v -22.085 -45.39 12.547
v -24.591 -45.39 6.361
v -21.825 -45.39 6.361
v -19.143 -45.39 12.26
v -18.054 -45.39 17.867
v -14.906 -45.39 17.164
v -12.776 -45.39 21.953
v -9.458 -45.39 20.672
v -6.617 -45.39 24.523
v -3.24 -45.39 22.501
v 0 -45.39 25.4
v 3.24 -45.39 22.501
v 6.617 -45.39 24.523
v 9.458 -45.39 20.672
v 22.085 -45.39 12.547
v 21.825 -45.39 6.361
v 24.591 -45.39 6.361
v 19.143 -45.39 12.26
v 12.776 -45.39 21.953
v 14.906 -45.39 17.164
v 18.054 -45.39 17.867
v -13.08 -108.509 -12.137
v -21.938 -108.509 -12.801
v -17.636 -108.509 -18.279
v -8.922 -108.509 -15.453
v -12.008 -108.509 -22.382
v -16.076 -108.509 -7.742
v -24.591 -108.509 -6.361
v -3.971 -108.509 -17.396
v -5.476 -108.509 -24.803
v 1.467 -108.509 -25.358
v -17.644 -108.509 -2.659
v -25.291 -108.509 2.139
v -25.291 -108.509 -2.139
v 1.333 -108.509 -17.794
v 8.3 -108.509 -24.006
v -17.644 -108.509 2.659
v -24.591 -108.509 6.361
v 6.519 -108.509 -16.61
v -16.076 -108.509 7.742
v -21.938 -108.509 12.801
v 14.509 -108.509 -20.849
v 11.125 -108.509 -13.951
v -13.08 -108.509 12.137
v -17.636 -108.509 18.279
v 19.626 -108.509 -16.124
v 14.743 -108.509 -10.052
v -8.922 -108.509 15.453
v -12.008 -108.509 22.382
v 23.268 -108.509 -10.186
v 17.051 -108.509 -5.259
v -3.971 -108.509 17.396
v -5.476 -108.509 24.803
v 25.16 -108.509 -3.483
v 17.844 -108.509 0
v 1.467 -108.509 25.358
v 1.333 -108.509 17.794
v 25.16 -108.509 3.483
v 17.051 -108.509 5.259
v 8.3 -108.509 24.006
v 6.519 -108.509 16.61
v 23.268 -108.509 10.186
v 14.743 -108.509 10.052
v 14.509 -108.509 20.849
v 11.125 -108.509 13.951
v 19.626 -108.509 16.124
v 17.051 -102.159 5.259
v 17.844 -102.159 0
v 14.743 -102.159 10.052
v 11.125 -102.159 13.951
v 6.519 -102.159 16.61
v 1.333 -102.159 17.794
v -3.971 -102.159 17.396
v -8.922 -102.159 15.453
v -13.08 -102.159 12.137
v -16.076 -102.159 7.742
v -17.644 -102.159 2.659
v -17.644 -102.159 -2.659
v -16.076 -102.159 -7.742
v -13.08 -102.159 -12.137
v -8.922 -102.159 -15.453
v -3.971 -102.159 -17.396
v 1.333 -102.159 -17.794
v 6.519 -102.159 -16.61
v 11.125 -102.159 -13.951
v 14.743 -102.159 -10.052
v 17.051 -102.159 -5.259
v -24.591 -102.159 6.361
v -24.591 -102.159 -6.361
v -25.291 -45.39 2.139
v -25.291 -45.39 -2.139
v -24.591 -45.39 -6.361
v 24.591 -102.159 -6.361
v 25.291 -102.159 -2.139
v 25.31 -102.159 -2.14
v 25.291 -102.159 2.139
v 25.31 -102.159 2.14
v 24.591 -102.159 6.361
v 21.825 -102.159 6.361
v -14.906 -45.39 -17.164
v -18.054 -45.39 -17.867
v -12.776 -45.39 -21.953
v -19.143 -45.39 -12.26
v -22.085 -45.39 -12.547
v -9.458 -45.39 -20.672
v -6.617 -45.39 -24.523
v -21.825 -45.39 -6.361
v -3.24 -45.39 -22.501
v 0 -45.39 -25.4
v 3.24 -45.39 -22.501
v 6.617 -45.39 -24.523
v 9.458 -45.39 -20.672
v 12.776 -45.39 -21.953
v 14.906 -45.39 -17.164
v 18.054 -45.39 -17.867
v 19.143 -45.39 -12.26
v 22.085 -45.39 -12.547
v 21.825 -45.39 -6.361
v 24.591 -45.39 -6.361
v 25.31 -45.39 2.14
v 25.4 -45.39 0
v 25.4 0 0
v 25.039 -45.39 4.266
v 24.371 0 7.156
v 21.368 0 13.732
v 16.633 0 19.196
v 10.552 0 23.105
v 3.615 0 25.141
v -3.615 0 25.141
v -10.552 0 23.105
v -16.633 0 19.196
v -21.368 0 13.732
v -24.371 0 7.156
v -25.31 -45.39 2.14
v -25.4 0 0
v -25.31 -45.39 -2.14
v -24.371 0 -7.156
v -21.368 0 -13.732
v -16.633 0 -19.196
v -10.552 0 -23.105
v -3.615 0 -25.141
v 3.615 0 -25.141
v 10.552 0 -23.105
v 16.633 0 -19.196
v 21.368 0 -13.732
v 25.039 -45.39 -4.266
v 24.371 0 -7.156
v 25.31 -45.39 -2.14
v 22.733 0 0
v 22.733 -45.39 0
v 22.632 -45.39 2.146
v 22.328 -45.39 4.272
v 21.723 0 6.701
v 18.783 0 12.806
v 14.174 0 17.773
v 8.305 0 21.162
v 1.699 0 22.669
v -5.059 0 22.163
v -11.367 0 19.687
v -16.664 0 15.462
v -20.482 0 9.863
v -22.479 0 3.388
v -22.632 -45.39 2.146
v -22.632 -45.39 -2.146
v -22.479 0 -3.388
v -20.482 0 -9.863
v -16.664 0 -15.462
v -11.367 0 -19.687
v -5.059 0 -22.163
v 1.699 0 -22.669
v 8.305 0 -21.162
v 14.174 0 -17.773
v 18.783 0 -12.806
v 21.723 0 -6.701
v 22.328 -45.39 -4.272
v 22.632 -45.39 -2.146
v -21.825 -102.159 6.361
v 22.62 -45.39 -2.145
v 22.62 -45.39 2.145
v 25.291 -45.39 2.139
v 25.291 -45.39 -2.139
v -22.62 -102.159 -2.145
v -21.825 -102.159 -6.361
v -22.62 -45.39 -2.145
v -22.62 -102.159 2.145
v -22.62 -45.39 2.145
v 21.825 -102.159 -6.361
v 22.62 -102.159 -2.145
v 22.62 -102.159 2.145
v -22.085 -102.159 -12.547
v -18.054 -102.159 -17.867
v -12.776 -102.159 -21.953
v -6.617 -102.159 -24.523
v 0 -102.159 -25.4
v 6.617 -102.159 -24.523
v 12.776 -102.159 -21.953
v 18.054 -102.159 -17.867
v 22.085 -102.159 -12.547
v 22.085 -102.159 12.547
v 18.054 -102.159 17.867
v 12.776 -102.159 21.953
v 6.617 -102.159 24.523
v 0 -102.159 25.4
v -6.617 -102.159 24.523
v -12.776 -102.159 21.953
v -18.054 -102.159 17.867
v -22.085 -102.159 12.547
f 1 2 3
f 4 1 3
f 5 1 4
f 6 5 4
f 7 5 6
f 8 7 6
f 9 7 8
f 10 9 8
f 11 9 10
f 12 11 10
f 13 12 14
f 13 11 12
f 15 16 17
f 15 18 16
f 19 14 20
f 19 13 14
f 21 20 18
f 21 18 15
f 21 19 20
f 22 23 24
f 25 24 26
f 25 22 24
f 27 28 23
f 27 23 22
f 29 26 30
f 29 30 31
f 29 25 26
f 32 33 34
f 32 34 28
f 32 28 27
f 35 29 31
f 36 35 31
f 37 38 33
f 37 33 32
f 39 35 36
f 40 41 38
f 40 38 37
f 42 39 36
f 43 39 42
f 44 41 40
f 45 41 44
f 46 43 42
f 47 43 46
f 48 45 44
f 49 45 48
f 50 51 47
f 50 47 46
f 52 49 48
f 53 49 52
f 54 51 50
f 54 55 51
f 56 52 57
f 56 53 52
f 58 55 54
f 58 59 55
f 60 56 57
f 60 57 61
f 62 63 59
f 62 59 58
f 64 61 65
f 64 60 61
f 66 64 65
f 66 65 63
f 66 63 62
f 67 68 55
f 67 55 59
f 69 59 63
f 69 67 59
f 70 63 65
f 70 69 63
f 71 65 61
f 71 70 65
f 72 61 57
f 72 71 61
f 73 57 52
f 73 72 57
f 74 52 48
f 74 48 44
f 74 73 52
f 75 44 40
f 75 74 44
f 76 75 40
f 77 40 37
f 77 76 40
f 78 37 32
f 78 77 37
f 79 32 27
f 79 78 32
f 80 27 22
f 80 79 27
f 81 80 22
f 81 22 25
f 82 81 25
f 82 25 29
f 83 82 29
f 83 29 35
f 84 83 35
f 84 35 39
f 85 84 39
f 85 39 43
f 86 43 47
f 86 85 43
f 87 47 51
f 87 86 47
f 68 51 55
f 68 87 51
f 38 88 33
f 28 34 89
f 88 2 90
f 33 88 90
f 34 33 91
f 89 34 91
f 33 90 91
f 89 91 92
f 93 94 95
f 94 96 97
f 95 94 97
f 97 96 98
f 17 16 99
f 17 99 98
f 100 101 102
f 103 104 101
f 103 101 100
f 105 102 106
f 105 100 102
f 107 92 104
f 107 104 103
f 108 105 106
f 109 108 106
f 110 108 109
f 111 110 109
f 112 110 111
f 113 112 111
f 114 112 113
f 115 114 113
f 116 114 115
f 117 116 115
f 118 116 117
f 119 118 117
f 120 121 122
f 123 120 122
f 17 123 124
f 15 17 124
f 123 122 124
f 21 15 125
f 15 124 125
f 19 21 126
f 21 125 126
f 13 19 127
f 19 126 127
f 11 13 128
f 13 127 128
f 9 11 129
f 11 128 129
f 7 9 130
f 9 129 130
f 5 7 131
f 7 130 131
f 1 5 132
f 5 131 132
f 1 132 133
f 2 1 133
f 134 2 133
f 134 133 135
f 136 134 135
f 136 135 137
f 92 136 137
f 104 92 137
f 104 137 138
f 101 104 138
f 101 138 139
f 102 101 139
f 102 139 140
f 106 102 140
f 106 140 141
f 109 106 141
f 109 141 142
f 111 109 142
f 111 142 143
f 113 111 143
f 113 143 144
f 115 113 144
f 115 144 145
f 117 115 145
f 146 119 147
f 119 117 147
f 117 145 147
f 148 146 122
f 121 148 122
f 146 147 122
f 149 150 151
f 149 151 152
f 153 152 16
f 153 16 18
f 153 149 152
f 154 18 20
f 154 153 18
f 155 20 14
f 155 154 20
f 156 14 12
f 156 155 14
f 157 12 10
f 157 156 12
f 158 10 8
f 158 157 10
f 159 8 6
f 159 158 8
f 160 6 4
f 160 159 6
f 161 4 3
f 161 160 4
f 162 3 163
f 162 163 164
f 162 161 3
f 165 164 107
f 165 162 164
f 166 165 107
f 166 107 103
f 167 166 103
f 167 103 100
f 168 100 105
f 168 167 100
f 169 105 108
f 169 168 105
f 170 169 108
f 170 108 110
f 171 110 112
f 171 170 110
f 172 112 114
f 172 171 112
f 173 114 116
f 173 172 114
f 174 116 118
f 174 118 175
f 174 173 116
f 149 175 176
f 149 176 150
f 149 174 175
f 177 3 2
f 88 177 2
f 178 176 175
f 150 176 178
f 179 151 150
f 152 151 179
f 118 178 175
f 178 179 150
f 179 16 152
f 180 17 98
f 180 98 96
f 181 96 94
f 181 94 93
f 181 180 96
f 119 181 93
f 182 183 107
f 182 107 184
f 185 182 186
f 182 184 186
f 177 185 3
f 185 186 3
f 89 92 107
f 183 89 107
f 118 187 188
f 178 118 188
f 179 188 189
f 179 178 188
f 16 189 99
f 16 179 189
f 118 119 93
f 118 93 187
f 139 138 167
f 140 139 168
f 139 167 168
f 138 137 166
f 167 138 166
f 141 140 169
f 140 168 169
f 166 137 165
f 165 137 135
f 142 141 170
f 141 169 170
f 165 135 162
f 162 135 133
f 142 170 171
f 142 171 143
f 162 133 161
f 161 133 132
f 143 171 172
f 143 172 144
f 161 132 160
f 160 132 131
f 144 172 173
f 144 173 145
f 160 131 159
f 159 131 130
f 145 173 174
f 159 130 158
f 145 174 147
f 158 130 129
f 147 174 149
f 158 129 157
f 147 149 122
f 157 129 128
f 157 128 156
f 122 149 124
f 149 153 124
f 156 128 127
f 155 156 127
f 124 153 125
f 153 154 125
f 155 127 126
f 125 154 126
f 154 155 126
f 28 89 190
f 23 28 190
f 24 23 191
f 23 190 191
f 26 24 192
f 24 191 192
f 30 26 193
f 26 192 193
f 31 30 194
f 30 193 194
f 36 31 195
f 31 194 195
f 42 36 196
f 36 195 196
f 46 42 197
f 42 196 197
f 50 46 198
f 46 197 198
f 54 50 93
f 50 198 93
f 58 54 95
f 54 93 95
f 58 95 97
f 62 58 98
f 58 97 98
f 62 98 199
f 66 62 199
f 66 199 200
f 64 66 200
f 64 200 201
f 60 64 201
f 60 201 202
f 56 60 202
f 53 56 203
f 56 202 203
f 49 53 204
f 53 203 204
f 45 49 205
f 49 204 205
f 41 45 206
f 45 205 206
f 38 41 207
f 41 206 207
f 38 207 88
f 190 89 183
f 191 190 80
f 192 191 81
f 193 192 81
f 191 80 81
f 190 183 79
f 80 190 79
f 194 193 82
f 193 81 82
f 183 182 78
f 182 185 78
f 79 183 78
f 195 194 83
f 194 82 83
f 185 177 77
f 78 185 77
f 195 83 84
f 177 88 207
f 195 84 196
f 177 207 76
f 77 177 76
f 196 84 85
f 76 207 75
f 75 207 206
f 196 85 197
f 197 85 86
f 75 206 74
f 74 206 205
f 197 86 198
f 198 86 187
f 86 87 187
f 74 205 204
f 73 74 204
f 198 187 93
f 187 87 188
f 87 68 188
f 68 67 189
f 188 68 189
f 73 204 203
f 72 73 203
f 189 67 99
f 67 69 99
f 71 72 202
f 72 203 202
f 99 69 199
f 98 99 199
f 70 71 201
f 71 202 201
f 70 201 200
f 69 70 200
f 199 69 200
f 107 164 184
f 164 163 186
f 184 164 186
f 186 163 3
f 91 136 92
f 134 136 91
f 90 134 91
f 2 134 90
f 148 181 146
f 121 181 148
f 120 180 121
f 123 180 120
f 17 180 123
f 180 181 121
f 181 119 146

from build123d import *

# Parameters (mm, degrees)
F0_R     = 25.4
F0_R_2   = 22.733
F1_DEPTH = 45.3898
F3_DEPTH = 56.769
F5_R     = 17.8435
F6_DEPTH = 6.35


# Not quite as in the source:
# - a feature of the source that left no trace in its solid (it failed there, or was rolled back) is left out


with BuildPart() as f1:
    # F0 (on Front) → F1 (new body)
    with BuildSketch(Plane.XZ):
        Circle(F0_R)
        Circle(F0_R_2, mode=Mode.SUBTRACT)
    extrude(amount=F1_DEPTH)

    # F2 (on face) → F3 (join)
    with BuildSketch(Plane.XZ.offset(45.3898)):
        with BuildLine():
            ThreePointArc((-21.8250152173, 6.3606603246), (-22.733, 0), (-21.8250152173, -6.3606603246))
            ThreePointArc((-21.8250152173, -6.3606603246), (-22.7199478828, 0), (-21.8250152173, 6.3606603246))
        make_face()
        with BuildLine():
            ThreePointArc((-24.5906892997, 6.3606603246), (-25.3794381847, 0), (-24.5906892997, -6.3606603246))
            Line((-24.5906892997, -6.3606603246), (-21.8250152173, -6.3606603246))
            ThreePointArc((-21.8250152173, -6.3606603246), (-22.733, 0), (-21.8250152173, 6.3606603246))
            Line((-21.8250152173, 6.3606603246), (-24.5906892997, 6.3606603246))
        make_face()
    extrude(amount=F3_DEPTH)

    # F4: F1 across plane


with BuildPart() as f1_1:
    add(f1.part)
    add(f1.part.mirror(Plane.YZ))

    # F5 (on face) → F6 (join)
    with BuildSketch(Plane.XZ.offset(102.1588)):
        with BuildLine():
            Line((-21.8250152173, 6.3606603246), (-24.5906892997, 6.3606603246))
            ThreePointArc((-24.5906892997, 6.3606603246), (-25.3794381847, 0), (-24.5906892997, -6.3606603246))
            Line((-24.5906892997, -6.3606603246), (-21.8250152173, -6.3606603246))
            ThreePointArc((-21.8250152173, -6.3606603246), (-22.7199478828, 0), (-21.8250152173, 6.3606603246))
        make_face()
        with BuildLine():
            ThreePointArc((-24.5906892997, -6.3606603246), (3.2059703513, -25.1968600049), (25.4, 0))
            ThreePointArc((25.4, 0), (3.2059703513, 25.1968600049), (-24.5906892997, 6.3606603246))
            Line((-24.5906892997, 6.3606603246), (-21.8250152173, 6.3606603246))
            ThreePointArc((-21.8250152173, 6.3606603246), (-22.7199478828, 0), (-21.8250152173, -6.3606603246))
            Line((-21.8250152173, -6.3606603246), (-24.5906892997, -6.3606603246))
        make_face()
        Circle(F5_R, mode=Mode.SUBTRACT)
    extrude(amount=F6_DEPTH)


solid = f1_1.part
